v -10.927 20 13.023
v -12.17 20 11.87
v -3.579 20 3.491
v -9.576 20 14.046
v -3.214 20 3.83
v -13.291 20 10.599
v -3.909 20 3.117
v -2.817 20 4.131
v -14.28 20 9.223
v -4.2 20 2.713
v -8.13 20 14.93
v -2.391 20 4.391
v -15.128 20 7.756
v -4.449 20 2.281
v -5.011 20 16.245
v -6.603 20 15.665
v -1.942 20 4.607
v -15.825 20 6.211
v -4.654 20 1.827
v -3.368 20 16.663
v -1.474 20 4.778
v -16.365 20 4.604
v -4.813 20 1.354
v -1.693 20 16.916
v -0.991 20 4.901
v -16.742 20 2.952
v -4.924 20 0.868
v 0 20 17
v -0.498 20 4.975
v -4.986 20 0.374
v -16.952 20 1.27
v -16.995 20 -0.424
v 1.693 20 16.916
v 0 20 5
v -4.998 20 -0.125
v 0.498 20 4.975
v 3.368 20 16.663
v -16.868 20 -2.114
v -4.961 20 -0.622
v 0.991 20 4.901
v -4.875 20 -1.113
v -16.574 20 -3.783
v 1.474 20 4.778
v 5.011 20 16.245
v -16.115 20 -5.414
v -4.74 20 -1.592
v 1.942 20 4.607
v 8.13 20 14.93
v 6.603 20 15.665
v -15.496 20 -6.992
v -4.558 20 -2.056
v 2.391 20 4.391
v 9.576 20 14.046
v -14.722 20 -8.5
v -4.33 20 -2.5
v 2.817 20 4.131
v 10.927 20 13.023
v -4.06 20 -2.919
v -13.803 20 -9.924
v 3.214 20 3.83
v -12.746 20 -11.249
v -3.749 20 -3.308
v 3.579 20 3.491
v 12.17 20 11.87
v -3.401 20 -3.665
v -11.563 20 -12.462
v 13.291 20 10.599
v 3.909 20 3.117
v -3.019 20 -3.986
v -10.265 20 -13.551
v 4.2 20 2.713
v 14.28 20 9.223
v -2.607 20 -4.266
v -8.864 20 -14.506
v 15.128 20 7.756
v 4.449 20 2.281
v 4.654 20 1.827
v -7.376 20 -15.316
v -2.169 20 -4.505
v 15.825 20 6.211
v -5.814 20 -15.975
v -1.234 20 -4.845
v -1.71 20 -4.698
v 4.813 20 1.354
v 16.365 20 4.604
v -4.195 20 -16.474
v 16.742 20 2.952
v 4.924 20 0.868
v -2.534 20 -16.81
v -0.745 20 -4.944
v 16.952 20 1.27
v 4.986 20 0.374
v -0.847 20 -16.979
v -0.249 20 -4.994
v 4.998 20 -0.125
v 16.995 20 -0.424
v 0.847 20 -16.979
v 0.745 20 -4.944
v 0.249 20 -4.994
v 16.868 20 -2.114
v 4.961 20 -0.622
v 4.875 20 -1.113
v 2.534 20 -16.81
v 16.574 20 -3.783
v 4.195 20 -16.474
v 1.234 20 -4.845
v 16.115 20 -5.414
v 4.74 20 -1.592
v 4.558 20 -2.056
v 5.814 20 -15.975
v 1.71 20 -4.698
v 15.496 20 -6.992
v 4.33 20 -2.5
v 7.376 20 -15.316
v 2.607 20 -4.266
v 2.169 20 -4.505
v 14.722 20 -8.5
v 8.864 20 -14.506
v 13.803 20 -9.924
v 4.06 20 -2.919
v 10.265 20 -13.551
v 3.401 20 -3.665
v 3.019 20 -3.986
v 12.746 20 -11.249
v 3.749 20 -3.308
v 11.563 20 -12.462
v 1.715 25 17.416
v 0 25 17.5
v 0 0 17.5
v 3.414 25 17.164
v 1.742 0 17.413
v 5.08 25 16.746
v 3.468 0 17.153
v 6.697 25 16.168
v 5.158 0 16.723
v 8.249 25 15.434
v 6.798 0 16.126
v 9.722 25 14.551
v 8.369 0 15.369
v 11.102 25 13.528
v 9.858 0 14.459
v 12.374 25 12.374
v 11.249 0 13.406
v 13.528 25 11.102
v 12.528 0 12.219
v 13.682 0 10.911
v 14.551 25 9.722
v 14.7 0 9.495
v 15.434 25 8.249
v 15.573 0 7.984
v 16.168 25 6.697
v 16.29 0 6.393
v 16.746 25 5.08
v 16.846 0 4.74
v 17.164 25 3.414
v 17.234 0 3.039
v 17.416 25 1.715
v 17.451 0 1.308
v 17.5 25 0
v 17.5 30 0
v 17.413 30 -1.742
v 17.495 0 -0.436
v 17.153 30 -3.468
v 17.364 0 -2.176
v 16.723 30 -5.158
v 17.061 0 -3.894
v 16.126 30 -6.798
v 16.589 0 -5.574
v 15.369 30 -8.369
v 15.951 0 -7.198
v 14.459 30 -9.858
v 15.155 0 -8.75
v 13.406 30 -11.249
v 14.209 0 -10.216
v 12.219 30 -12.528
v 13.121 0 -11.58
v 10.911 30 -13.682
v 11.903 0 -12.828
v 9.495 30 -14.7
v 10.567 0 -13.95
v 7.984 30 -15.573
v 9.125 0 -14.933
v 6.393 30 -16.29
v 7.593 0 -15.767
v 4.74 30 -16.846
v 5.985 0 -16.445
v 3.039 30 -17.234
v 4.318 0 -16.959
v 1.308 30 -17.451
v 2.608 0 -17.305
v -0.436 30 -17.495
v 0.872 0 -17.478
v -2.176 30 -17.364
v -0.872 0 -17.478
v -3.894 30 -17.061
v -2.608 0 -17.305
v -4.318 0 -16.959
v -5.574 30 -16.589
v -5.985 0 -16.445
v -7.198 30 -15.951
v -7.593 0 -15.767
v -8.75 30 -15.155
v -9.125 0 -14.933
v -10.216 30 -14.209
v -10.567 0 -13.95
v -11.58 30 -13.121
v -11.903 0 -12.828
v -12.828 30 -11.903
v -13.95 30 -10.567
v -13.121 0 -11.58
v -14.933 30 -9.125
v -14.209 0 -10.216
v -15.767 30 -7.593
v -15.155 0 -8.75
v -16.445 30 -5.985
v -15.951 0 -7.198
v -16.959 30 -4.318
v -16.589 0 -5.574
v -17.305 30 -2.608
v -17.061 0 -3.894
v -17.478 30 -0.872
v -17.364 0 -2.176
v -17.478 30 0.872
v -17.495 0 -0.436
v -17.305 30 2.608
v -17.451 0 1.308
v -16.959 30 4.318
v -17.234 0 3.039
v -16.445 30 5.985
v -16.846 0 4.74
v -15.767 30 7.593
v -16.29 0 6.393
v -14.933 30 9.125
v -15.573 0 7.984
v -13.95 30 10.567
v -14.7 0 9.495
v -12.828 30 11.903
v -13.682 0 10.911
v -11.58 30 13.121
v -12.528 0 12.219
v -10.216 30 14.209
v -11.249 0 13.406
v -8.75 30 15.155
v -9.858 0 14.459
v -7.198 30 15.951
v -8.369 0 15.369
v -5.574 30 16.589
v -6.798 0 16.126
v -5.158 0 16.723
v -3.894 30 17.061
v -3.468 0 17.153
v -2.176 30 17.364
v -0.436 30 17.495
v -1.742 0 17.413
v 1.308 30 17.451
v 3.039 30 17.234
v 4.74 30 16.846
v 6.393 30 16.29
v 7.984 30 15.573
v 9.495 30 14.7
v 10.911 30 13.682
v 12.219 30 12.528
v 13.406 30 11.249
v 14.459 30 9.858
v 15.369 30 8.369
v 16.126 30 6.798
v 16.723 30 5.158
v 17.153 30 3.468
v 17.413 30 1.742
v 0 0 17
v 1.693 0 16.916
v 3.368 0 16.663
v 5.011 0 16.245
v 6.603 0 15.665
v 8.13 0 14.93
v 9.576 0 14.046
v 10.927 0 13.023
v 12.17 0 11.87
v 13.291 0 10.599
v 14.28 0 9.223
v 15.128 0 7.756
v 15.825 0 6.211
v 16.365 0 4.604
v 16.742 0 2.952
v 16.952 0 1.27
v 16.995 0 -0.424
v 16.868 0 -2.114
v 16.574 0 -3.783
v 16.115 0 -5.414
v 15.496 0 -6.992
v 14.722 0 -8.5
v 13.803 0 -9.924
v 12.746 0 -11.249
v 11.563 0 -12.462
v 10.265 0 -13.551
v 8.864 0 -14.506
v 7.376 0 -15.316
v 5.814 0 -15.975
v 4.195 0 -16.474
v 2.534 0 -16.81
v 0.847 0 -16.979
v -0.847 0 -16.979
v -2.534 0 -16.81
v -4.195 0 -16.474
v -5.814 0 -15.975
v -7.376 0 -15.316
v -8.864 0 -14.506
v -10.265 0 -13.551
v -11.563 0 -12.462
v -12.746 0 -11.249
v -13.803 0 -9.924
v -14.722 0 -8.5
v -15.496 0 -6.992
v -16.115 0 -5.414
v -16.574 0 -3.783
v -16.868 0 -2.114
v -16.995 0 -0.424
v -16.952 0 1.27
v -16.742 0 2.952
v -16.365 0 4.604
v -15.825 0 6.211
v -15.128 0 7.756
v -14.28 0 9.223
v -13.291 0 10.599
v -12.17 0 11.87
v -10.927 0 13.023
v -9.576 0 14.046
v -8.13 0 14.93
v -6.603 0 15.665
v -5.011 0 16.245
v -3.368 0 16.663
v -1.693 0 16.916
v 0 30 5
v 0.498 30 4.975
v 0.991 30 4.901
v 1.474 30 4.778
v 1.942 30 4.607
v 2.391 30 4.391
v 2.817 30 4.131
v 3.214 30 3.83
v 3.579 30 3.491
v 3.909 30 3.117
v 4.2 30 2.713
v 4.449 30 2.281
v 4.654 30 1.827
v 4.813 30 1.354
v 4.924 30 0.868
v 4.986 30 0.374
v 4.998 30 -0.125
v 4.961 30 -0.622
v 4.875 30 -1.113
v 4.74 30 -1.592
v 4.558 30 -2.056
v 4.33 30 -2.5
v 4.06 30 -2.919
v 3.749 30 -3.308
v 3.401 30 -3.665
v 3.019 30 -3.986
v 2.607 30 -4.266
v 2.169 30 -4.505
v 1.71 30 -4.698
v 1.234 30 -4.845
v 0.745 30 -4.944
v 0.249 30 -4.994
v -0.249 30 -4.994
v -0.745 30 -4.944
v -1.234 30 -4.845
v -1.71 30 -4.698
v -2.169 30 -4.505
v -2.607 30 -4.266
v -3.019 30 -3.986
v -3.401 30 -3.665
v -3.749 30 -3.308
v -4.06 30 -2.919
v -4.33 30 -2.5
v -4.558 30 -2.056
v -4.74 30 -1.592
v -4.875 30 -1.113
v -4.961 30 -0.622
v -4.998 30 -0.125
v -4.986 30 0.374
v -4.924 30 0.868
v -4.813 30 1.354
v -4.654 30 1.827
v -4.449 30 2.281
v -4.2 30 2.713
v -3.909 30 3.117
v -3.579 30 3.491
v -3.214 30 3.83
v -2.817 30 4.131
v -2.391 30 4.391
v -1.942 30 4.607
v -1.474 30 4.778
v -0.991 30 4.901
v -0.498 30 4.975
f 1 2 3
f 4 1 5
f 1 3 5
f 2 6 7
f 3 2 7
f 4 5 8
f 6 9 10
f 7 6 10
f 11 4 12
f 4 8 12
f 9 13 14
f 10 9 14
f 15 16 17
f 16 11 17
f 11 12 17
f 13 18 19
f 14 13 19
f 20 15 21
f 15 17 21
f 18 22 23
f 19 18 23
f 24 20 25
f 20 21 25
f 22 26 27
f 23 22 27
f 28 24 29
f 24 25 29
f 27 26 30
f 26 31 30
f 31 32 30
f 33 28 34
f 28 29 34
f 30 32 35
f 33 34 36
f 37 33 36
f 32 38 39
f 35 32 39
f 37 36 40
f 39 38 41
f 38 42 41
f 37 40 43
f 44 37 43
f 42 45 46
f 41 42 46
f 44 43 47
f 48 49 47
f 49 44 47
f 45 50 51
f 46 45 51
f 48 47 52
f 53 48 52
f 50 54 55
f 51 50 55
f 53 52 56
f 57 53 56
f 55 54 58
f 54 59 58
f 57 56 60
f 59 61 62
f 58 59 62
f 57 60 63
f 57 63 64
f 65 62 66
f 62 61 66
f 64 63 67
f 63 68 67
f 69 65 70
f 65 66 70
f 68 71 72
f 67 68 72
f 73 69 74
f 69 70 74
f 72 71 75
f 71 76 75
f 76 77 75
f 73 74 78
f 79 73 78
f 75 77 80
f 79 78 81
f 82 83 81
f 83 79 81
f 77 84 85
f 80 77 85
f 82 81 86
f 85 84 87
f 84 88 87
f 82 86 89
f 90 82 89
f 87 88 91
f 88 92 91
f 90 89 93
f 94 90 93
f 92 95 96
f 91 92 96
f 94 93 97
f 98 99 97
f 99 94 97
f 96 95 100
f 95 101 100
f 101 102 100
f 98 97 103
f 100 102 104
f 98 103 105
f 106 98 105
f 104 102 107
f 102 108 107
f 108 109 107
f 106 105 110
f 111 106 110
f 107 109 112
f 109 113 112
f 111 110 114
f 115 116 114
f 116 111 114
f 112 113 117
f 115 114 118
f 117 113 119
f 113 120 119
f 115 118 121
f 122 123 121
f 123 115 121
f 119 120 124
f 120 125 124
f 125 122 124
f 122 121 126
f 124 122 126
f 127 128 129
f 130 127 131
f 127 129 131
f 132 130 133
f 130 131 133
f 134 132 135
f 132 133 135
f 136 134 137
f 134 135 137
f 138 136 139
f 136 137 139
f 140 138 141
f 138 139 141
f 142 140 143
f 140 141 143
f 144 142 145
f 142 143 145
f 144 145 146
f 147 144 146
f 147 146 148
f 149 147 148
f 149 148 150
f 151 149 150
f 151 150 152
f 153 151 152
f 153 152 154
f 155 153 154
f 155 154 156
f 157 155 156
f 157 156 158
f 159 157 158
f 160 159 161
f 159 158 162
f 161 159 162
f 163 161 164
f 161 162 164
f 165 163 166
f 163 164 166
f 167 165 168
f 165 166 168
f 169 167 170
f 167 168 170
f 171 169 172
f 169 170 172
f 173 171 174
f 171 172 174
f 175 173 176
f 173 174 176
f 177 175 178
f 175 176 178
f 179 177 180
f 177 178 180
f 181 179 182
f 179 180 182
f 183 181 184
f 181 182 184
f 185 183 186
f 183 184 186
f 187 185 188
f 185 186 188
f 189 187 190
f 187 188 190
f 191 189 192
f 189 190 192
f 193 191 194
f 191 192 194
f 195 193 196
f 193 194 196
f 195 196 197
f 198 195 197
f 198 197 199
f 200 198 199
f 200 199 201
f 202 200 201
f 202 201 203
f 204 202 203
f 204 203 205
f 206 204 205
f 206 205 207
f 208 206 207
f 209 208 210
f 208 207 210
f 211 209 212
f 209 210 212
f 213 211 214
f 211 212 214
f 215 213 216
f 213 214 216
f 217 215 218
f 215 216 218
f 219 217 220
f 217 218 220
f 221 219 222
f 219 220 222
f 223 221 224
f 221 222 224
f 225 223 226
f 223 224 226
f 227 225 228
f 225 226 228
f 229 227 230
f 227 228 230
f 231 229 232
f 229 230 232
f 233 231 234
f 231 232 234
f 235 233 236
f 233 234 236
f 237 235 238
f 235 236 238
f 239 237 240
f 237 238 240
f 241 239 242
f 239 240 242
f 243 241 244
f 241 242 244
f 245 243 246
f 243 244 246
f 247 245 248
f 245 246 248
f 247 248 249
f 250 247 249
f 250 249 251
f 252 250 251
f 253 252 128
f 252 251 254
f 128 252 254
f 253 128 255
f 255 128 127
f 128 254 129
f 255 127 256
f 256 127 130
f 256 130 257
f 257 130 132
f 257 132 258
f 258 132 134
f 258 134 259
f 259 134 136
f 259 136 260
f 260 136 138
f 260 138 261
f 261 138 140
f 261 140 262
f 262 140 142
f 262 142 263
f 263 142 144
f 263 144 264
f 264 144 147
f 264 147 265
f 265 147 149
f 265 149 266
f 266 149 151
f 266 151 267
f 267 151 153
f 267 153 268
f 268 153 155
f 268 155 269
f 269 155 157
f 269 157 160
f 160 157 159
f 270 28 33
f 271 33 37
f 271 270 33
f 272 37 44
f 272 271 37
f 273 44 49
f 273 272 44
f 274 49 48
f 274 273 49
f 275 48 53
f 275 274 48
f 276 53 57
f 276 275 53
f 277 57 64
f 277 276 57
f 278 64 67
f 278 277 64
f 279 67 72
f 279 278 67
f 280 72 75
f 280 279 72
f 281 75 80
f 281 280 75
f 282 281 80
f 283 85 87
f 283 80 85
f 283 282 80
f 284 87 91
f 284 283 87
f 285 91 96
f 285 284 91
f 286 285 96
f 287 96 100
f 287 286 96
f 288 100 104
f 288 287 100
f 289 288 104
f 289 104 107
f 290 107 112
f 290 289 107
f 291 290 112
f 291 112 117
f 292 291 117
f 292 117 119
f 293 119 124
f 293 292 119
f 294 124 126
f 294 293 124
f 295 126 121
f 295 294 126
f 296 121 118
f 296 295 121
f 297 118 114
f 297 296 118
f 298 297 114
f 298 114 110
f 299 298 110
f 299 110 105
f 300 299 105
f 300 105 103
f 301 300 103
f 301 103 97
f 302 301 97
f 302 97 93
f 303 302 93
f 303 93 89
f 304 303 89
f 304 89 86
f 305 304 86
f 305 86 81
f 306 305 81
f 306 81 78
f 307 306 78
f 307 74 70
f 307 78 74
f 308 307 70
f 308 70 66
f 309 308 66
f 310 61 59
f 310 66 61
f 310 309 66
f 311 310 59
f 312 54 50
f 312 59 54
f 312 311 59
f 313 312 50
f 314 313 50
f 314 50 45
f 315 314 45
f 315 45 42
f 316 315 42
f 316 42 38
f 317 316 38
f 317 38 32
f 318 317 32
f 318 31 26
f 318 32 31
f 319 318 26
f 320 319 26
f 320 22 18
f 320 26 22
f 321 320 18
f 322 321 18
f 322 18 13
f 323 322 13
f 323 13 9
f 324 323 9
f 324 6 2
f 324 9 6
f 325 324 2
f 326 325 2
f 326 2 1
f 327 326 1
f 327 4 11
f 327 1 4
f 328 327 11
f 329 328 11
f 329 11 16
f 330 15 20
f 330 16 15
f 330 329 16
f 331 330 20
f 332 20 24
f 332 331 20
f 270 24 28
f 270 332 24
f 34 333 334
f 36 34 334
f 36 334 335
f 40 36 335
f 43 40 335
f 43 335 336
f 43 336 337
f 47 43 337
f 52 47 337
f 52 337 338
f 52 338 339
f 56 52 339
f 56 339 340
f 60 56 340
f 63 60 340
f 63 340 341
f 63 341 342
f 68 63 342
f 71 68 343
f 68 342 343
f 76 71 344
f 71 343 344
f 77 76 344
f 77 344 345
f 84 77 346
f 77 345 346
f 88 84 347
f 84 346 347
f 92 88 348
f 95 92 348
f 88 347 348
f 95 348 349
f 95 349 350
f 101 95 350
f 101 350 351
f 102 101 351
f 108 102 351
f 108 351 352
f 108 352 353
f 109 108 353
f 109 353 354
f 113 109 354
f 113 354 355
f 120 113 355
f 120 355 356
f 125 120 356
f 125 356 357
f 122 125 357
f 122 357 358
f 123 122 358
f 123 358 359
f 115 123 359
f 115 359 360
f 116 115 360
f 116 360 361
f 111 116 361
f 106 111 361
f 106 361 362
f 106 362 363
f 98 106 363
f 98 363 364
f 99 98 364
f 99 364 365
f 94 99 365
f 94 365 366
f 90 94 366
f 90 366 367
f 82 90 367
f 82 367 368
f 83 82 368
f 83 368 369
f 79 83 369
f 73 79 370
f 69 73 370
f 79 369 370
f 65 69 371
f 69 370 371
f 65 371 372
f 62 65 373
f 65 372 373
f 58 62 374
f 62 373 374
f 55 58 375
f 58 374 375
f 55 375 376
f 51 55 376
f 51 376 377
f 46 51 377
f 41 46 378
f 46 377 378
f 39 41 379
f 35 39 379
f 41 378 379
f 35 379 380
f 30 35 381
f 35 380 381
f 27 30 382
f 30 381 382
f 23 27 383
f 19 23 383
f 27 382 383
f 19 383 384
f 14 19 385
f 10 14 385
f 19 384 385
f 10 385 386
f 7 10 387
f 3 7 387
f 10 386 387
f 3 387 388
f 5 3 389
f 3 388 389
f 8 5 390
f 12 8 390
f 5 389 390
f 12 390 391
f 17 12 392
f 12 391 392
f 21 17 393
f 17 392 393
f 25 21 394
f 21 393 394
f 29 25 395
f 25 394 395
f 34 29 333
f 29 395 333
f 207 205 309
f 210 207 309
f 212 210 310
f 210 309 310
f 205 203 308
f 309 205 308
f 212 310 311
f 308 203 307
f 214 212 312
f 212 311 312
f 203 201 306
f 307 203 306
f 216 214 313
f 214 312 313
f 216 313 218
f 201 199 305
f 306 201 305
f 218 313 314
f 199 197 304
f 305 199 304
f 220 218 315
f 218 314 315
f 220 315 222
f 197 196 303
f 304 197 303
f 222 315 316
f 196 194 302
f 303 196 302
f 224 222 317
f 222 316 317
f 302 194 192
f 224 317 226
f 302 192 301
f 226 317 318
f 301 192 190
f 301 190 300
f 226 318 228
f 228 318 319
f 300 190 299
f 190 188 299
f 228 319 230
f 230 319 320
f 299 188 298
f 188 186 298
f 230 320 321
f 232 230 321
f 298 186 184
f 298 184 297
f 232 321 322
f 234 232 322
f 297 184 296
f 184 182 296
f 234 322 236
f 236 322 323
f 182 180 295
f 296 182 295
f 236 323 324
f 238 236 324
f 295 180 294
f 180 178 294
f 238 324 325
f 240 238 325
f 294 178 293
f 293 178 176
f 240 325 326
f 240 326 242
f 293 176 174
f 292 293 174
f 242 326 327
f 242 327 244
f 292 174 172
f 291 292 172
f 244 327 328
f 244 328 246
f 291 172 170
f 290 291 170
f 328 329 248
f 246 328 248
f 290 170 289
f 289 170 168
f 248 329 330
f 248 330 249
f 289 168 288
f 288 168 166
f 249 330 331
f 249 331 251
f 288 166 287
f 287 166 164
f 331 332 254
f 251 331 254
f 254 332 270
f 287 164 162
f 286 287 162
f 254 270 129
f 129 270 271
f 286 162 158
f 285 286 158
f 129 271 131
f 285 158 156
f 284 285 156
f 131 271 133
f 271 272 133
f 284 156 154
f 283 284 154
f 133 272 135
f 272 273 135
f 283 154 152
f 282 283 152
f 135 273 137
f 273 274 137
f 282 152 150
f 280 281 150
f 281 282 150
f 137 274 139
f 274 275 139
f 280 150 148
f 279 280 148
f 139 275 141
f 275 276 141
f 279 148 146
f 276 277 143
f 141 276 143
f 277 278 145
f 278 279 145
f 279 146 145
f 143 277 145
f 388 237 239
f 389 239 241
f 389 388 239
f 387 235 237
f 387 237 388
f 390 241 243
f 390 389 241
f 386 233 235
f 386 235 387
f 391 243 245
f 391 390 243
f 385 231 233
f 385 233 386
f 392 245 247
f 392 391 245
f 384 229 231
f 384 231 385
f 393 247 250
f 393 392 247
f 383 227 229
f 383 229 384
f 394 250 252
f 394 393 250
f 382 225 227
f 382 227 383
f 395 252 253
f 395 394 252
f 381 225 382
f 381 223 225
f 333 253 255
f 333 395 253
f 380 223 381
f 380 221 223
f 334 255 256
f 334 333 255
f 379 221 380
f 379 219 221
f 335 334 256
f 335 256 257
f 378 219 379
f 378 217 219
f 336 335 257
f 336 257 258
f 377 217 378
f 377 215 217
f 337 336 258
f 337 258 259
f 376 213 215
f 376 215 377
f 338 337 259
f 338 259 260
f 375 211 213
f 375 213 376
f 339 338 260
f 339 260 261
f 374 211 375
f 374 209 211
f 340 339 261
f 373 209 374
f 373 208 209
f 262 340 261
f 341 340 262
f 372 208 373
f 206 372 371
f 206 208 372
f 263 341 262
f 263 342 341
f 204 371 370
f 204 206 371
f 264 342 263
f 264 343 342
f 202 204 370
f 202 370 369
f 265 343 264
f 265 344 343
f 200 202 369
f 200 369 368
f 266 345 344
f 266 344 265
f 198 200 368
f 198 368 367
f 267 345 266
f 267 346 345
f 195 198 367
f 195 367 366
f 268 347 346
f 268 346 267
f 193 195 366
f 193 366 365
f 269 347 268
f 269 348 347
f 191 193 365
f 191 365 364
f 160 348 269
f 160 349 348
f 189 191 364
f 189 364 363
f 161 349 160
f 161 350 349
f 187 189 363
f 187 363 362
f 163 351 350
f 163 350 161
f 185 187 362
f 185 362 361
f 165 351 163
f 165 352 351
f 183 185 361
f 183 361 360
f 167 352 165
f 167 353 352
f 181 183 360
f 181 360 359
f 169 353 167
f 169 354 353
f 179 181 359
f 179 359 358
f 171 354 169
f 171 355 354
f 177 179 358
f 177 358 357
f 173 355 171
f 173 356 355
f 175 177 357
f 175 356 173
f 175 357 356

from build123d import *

# Parameters (mm, degrees)
IZIM1_R                     = 17.5
IZIM1_R_2                   = 17
Y_KSEKLIK_EKSTR_ZYON1_DEPTH = 25
KAL_NLA_T_R2_START          = 20
KAL_NLA_T_R2_OUTLINE_R      = 17.5
KAL_NLA_T_R2_DEPTH          = 10
IZIM5_R                     = 5
KES_EKSTR_ZYON4_DEPTH       = 25


# Read off the part's stored shape, not the designer's step: Kalınlaştır2
with BuildPart() as part:
    # Çizim1 → Yükseklik-Ekstrüzyon1 (new body)
    with BuildSketch(Plane(origin=(0, 0, 0), x_dir=(1, 0, 0), z_dir=(0, 1, 0))):
        with Locations(Location((0, 0, 0), (0, 0, 270))):
            Circle(IZIM1_R)
        with Locations(Location((0, 0, 0), (0, 0, 270))):
            Circle(IZIM1_R_2, mode=Mode.SUBTRACT)
    extrude(amount=Y_KSEKLIK_EKSTR_ZYON1_DEPTH)

    # Kalınlaştır2 outline → Kalınlaştır2 (add)
    with BuildSketch(Plane(origin=(0, 0, 0), x_dir=(1, 0, 0), z_dir=(0, 1, 0)).offset(KAL_NLA_T_R2_START)):
        Circle(KAL_NLA_T_R2_OUTLINE_R)
    extrude(amount=KAL_NLA_T_R2_DEPTH)

    # Çizim5 → Kes-Ekstrüzyon4 (cut)
    with BuildSketch(Plane(origin=(0, 30, 0), x_dir=(1, 0, 0), z_dir=(0, 1, 0))):
        with Locations(Location((0, 0, 0), (0, 0, 270))):
            Circle(IZIM5_R)
    extrude(amount=-KES_EKSTR_ZYON4_DEPTH, mode=Mode.SUBTRACT)


solid = part.part
